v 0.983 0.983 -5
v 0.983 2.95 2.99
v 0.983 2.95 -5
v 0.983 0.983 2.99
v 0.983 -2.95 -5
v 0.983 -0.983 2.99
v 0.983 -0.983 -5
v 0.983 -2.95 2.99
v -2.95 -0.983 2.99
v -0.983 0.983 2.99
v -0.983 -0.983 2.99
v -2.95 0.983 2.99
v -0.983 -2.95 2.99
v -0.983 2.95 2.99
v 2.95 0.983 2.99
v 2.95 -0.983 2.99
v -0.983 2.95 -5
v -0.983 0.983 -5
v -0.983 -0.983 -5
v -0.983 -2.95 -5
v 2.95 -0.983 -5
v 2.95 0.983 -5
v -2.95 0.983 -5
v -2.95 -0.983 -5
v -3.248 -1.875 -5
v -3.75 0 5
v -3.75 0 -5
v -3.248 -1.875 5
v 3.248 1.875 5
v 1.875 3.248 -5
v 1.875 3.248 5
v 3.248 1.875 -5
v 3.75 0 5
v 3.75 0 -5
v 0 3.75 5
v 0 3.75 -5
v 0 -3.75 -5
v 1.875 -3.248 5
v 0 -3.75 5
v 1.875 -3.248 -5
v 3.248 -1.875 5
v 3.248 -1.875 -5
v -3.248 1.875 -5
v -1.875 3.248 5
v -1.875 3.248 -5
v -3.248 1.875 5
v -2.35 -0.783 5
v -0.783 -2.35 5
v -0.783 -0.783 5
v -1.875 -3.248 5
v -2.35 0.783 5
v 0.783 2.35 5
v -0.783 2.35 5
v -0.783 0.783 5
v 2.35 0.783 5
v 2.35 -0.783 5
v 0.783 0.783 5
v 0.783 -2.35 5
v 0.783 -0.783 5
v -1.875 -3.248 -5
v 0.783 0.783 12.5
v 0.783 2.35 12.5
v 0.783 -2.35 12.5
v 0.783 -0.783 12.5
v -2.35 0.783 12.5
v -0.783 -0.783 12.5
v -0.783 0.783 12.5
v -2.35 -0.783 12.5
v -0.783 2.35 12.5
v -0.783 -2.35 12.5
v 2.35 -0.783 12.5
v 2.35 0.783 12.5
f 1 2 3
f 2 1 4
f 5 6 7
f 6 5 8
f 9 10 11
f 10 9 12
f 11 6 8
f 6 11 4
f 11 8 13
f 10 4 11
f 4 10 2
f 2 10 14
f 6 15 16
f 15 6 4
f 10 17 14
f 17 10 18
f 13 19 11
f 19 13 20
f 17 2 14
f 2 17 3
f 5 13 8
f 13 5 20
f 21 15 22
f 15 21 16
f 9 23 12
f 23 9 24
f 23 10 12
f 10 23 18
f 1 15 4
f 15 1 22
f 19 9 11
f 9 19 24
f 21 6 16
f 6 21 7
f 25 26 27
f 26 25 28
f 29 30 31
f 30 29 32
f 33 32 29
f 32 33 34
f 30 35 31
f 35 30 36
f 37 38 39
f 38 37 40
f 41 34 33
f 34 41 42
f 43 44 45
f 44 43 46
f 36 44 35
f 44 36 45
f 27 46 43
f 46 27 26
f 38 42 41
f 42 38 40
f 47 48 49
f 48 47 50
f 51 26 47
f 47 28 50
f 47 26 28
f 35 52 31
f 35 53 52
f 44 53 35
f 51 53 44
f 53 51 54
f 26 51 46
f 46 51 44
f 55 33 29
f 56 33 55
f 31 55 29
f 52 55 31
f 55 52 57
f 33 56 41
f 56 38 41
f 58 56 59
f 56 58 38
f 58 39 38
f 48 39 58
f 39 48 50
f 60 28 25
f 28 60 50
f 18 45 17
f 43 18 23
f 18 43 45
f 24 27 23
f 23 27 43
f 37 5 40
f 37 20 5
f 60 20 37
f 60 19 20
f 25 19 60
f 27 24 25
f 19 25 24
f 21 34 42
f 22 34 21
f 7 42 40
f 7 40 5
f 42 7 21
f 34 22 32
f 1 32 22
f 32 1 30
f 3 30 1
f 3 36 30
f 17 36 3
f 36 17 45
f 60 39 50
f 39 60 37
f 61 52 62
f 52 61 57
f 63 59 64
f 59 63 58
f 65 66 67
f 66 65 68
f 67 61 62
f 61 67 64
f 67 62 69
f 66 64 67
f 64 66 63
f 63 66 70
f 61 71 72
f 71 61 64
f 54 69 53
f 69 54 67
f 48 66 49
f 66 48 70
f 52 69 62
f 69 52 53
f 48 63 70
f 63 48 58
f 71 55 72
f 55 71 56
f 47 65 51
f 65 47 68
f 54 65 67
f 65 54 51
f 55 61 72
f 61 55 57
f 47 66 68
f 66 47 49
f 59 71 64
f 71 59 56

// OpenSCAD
topAxleWidth = 4.7;
bottomAxleWidth = 5.9;

difference() {
    cylinder(h = 10, r1 = 3.75, r2 = 3.75, center = true);
    translate([0,0,-1.01]) {
        union() {
            cube(size = [bottomAxleWidth/3,bottomAxleWidth,8], center = true);
            cube(size = [bottomAxleWidth,bottomAxleWidth/3,8], center = true);
        }
    }
}
translate([0,0,8.75]) {
    cube(size = [topAxleWidth/3,topAxleWidth,7.5], center = true);
    cube(size = [topAxleWidth,topAxleWidth/3,7.5], center = true);
}
